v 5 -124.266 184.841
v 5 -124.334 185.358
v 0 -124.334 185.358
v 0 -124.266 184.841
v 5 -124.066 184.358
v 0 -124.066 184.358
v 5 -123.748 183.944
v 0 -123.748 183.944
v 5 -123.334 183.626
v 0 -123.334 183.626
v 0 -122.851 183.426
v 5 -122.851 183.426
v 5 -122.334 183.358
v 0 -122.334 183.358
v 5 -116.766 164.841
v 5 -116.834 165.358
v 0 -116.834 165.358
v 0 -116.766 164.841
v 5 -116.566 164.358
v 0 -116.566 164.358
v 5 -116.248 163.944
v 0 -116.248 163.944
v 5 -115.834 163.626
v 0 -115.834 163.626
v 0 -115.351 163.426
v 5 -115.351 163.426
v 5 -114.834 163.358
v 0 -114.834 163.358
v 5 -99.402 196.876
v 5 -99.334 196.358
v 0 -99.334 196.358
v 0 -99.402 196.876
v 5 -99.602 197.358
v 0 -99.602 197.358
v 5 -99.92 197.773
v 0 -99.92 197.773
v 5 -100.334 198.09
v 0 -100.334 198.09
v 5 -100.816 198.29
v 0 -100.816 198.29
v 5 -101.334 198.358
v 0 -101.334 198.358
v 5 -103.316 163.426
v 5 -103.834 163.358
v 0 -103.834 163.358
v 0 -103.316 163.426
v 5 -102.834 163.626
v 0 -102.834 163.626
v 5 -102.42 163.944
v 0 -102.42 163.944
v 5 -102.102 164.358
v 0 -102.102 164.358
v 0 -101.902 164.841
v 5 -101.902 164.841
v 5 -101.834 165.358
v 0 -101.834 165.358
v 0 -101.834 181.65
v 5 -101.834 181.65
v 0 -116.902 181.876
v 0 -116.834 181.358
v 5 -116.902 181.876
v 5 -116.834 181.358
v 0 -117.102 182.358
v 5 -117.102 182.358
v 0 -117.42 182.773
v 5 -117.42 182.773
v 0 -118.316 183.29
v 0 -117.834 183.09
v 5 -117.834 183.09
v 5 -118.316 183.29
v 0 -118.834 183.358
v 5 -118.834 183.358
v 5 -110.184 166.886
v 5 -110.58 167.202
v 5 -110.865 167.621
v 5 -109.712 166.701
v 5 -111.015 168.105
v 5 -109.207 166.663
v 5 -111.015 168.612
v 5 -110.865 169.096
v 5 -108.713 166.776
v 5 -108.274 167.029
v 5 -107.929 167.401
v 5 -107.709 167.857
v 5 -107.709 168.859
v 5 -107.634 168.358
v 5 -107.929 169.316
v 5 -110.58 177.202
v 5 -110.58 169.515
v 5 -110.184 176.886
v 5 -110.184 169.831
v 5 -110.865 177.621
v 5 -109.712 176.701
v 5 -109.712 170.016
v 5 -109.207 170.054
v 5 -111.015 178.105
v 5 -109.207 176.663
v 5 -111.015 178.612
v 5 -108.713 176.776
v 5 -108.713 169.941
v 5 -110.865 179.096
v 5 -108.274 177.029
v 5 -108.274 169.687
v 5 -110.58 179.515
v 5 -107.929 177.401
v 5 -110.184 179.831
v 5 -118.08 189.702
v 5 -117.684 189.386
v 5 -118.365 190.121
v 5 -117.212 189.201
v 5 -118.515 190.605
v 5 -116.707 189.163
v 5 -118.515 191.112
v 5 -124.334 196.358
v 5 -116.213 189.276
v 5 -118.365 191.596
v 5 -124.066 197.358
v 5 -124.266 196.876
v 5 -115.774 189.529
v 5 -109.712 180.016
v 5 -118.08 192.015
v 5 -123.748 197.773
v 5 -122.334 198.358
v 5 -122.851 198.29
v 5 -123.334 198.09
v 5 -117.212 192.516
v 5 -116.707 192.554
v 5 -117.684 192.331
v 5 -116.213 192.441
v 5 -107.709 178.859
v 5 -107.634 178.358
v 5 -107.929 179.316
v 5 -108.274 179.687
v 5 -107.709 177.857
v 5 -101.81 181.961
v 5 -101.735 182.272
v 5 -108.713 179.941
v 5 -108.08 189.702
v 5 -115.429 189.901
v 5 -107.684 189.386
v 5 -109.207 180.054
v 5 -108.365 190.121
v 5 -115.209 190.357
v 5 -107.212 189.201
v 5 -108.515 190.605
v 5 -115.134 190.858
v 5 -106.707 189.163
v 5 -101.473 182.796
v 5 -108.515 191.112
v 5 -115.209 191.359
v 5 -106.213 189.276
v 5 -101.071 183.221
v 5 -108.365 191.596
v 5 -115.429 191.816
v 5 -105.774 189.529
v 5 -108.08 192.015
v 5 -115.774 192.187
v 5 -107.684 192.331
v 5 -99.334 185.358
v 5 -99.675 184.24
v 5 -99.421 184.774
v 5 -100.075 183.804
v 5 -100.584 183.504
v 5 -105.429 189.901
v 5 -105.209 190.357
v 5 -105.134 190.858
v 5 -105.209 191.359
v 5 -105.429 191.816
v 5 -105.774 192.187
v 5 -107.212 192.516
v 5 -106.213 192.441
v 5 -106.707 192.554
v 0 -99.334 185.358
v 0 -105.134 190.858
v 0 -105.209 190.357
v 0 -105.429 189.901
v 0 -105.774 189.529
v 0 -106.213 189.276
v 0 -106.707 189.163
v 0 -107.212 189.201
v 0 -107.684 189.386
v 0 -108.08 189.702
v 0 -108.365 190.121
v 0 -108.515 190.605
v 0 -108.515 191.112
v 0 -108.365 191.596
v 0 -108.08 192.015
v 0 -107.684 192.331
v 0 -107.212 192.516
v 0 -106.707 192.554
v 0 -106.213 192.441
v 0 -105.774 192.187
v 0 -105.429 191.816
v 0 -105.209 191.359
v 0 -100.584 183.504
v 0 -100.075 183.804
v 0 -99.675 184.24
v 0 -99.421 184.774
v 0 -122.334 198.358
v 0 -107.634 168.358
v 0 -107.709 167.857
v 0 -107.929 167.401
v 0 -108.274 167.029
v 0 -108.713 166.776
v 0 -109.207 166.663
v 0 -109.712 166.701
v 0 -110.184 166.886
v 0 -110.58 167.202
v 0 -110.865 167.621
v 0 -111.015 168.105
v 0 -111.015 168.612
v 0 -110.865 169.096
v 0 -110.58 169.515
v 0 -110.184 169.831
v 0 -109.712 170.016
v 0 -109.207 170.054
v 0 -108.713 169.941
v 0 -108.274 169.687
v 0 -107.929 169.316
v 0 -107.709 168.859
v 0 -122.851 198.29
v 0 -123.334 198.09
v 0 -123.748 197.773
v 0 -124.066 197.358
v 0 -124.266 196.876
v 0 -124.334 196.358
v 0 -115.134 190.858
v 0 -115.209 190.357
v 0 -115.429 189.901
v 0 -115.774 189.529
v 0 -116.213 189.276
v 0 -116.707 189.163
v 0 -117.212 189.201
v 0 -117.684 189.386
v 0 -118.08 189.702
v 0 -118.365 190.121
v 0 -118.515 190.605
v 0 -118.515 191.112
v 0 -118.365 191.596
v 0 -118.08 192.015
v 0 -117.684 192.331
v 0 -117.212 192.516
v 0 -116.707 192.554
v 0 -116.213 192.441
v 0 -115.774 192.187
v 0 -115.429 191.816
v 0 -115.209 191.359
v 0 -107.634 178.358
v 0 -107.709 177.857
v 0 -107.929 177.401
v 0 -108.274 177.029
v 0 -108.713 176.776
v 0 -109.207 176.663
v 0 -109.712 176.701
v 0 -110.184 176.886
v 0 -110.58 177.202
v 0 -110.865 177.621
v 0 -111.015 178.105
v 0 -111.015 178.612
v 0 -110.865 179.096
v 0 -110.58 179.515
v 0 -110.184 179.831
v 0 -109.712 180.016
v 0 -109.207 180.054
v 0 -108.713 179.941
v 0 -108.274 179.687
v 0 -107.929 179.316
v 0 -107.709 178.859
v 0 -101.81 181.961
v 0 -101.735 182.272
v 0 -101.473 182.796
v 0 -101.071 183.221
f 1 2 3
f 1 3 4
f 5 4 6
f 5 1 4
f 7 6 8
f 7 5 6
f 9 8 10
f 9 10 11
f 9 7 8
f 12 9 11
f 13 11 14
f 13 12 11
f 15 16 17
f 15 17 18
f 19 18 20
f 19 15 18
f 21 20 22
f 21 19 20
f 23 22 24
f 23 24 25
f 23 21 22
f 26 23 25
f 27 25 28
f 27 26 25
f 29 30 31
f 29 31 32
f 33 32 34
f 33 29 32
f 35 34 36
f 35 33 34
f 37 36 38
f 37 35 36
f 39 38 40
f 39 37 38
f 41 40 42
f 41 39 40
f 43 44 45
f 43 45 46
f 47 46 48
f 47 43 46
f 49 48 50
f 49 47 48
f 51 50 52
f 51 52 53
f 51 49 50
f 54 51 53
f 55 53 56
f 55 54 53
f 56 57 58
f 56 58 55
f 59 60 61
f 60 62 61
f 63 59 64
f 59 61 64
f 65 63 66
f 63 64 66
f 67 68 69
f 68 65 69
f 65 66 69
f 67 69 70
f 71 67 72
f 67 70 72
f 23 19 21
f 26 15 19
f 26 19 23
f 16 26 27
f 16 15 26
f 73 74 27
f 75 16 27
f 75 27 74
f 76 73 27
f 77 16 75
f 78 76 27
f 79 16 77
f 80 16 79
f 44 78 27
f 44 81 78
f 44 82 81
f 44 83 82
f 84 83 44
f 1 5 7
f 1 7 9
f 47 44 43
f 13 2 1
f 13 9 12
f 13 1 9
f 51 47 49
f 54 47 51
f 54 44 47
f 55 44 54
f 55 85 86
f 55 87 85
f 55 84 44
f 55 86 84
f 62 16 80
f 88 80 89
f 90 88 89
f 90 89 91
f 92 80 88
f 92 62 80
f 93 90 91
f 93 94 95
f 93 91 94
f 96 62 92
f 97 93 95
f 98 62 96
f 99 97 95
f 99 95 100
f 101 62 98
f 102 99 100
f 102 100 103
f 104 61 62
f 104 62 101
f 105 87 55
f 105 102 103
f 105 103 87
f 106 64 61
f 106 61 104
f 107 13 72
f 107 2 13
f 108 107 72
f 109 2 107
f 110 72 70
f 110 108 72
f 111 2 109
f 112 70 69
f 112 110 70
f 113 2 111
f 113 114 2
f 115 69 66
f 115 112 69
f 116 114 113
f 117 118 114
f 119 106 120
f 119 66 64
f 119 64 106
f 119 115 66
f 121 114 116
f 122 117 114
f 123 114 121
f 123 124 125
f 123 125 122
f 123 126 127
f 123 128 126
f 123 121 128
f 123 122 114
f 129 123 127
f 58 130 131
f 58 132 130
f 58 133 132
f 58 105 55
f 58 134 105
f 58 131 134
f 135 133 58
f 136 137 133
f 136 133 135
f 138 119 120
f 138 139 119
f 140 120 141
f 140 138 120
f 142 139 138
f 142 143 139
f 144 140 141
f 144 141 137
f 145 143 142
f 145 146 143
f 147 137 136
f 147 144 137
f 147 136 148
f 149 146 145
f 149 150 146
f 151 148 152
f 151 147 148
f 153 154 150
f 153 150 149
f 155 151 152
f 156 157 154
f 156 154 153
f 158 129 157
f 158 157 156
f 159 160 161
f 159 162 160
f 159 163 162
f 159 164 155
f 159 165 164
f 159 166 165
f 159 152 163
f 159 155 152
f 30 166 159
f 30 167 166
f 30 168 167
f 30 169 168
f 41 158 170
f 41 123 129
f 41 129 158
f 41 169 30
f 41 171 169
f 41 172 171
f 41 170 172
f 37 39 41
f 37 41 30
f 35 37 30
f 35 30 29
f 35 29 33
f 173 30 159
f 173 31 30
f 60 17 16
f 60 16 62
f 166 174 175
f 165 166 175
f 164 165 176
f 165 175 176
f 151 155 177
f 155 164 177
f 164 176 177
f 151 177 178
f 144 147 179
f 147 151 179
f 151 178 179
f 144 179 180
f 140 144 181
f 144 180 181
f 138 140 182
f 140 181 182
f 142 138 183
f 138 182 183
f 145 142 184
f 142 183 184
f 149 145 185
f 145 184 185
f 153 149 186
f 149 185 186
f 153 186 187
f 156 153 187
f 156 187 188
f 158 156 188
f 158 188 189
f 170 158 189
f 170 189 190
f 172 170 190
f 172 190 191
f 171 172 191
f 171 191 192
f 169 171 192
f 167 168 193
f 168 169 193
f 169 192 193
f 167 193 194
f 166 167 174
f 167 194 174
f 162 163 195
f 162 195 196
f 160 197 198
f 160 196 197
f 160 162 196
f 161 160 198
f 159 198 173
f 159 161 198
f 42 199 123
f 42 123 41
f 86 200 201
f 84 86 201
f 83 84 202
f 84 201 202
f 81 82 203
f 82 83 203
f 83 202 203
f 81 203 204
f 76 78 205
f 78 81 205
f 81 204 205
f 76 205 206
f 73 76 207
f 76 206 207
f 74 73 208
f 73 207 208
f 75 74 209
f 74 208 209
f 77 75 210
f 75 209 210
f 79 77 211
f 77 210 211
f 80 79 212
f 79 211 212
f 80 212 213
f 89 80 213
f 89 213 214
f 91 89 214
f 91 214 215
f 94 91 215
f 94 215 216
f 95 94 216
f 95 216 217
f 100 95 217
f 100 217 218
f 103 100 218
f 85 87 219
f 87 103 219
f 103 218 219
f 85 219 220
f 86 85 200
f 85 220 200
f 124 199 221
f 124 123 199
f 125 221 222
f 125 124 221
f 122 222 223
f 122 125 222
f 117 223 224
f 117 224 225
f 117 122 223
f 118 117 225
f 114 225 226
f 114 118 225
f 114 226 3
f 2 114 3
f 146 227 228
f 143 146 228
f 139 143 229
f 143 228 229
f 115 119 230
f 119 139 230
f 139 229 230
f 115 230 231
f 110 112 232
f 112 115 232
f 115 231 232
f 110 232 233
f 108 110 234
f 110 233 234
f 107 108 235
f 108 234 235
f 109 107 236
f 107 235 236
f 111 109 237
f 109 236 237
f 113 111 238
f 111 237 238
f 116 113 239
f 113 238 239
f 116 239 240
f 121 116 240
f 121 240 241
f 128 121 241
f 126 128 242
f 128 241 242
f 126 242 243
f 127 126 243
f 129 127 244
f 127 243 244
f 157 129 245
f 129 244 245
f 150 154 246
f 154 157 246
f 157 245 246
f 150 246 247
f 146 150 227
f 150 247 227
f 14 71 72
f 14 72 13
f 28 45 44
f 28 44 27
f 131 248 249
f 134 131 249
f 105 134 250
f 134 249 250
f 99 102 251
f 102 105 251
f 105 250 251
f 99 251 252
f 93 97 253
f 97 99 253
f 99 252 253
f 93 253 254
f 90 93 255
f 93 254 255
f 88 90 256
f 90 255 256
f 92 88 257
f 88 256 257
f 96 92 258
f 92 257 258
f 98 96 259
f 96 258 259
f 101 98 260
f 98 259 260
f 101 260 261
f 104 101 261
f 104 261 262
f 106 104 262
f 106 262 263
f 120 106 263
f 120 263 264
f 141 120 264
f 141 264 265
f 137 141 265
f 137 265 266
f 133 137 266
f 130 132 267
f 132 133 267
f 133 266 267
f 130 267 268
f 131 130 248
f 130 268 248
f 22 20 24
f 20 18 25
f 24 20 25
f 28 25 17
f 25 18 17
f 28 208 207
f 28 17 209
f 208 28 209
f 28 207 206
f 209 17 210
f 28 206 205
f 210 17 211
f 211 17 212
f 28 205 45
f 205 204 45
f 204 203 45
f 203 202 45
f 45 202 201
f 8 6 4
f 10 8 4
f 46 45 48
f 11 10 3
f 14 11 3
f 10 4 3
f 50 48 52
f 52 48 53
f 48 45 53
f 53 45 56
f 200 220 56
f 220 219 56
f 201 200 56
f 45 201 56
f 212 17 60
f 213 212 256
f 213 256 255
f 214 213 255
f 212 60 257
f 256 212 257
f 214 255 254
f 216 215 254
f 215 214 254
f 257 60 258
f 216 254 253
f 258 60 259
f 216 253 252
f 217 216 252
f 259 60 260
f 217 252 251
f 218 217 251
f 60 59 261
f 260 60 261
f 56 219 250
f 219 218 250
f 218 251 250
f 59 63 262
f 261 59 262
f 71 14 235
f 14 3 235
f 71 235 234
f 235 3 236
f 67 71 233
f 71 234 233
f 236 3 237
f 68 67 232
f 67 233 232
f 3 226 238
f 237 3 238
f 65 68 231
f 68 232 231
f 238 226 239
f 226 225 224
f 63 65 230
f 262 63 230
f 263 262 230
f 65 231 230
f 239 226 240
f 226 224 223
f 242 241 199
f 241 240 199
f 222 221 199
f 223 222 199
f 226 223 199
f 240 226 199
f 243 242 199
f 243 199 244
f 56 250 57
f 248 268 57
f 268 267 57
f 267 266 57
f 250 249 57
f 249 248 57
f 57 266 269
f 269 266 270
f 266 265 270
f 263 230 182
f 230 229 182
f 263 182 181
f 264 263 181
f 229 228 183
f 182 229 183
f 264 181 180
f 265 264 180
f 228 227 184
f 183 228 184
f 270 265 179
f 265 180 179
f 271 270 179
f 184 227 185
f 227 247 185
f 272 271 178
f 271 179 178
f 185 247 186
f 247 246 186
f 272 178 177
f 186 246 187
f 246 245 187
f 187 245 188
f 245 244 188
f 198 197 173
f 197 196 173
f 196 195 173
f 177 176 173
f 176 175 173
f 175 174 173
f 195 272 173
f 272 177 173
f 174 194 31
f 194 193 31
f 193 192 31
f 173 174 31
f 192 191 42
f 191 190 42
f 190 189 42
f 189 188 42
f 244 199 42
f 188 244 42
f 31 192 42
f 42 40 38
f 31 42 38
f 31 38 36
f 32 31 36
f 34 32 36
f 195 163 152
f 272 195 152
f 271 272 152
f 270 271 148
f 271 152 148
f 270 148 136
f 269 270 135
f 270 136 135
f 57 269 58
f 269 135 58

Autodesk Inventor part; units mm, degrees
ref_plane "YZ Plane" through (0, 0, 0) normal (1, 0, 0) x (0, 1, 0)
ref_plane "XZ Plane" through (0, 0, 0) normal (0, 1, 0) x (-1, 0, 0)
ref_plane "XY Plane" through (0, 0, 0) normal (0, 0, 1) x (1, 0, 0)
sketch "スケッチ1" plane through (0, 0, 0) normal (1, 0, 0) x (0, 1, 0)
  line L0 (-166.8338, 198.3583) -> (193.1662, 198.3583)
  line L1 (193.1662, 198.3583) -> (193.1662, 183.3583)
  line L2 (193.1662, 183.3583) -> (-166.8338, 183.3583)
  line L3 (-166.8338, 183.3583) -> (-166.8338, 198.3583)
  line L4 (-166.8338, 233.3583) -> (-181.8338, 233.3583)
  line L5 (-181.8338, 233.3583) -> (-181.8338, 5.8583)
  line L6 (-181.8338, 5.8583) -> (-166.8338, 5.8583)
  line L7 (-166.8338, 5.8583) -> (-166.8338, 233.3583)
  line L8 (-166.8338, 233.3583) -> (-181.8338, 233.3583)
  line L9 (-181.8338, 233.3583) -> (-181.8338, 218.3583)
  line L10 (-181.8338, 218.3583) -> (-166.8338, 218.3583)
  line L11 (-166.8338, 218.3583) -> (-166.8338, 233.3583)
  line L12 (-116.8338, 183.3583) -> (-101.8338, 183.3583)
  line L13 (-101.8338, 183.3583) -> (-101.8338, 5.8583)
  line L14 (-101.8338, 5.8583) -> (-116.8338, 5.8583)
  line L15 (-116.8338, 5.8583) -> (-116.8338, 183.3583)
  line L16 (193.1662, 183.3583) -> (178.1662, 183.3583)
  line L17 (178.1662, 183.3583) -> (178.1662, 5.8583)
  line L18 (178.1662, 5.8583) -> (193.1662, 5.8583)
  line L19 (193.1662, 5.8583) -> (193.1662, 183.3583)
  circle A0 centre (-141.8338, 138.3583) radius 12.5
  circle A1 centre (-141.8338, 98.3583) radius 18.75
  line L20 (193.1662, 5.8583) -> (-166.8338, 5.8583)
  line L21 (-181.8338, 158.3583) -> (-101.8338, 158.3583)
  line L22 (-101.8338, 78.3583) -> (-181.8338, 78.3583)
  circle A2 centre (-141.8338, 98.3583) radius 20
  line L23 (-124.3338, 198.3583) -> (-124.3338, 183.3583)
  line L24 (-101.8338, 183.3583) -> (-101.8338, 198.3583)
  line L25 (-146.8338, 198.3583) -> (-146.8338, 183.3583)
  line L26 (-166.8338, 205.8583) -> (-181.8338, 205.8583)
  line L27 (-166.8338, 175.8583) -> (-181.8338, 175.8583)
  circle A3 centre (158.1662, 138.3583) radius 12.5
  line L28 (193.1662, 163.3583) -> (178.1662, 163.3583)
  line L29 (170.6662, 198.3583) -> (170.6662, 183.3583)
  line L30 (-166.8338, -186.6417) -> (193.1662, -186.6417)
  line L31 (193.1662, -186.6417) -> (193.1662, -171.6417)
  line L32 (193.1662, -171.6417) -> (-166.8338, -171.6417)
  line L33 (-166.8338, -171.6417) -> (-166.8338, -186.6417)
  line L34 (-166.8338, -221.6417) -> (-181.8338, -221.6417)
  line L35 (-181.8338, -221.6417) -> (-181.8338, 5.8583)
  line L36 (-166.8338, 5.8583) -> (-166.8338, -221.6417)
  line L37 (-166.8338, -221.6417) -> (-181.8338, -221.6417)
  line L38 (-181.8338, -221.6417) -> (-181.8338, -206.6417)
  line L39 (-181.8338, -206.6417) -> (-166.8338, -206.6417)
  line L40 (-166.8338, -206.6417) -> (-166.8338, -221.6417)
  line L41 (-116.8338, -171.6417) -> (-101.8338, -171.6417)
  line L42 (-101.8338, -171.6417) -> (-101.8338, 5.8583)
  line L43 (-116.8338, 5.8583) -> (-116.8338, -171.6417)
  line L44 (193.1662, -171.6417) -> (178.1662, -171.6417)
  line L45 (178.1662, -171.6417) -> (178.1662, 5.8583)
  line L46 (193.1662, 5.8583) -> (193.1662, -171.6417)
  circle A4 centre (-141.8338, -126.6417) radius 12.5
  circle A5 centre (-141.8338, -86.6417) radius 18.75
  line L47 (-181.8338, -146.6417) -> (-101.8338, -146.6417)
  line L48 (-101.8338, -66.6417) -> (-181.8338, -66.6417)
  circle A6 centre (-141.8338, -86.6417) radius 20
  line L49 (-124.3338, -186.6417) -> (-124.3338, -171.6417)
  line L50 (-101.8338, -171.6417) -> (-101.8338, -186.6417)
  line L51 (-146.8338, -186.6417) -> (-146.8338, -171.6417)
  line L52 (-166.8338, -194.1417) -> (-181.8338, -194.1417)
  line L53 (-166.8338, -164.1417) -> (-181.8338, -164.1417)
  circle A7 centre (158.1662, -126.6417) radius 12.5
  line L54 (193.1662, -151.6417) -> (178.1662, -151.6417)
  line L55 (170.6662, -186.6417) -> (170.6662, -171.6417)
  line L56 (193.1662, 158.3583) -> (145.6662, 158.3583)
  line L57 (145.6662, 158.3583) -> (145.6662, 78.3583)
  line L58 (145.6662, 78.3583) -> (193.1662, 78.3583)
  line L59 (193.1662, 78.3583) -> (193.1662, 158.3583)
  line L60 (178.1662, 158.3583) -> (154.1437, 150.1934)
  line L61 (147.3229, 132.1397) -> (178.1662, 78.3583)
  circle A8 centre (-116.8338, 190.8583) radius 1.7
  circle A9 centre (-106.8338, 190.8583) radius 1.7
  circle A10 centre (-109.3338, 178.3583) radius 1.7
  circle A11 centre (-109.3338, 168.3583) radius 1.7
  line L62 (-101.8338, 163.3583) -> (-116.8338, 163.3583)
  line L63 (-99.3338, 198.3583) -> (-99.3338, 183.3583)
  point P0 (0, 0)
  point P1 (-174.3338, 200.8583)
  point P2 (-174.3338, 190.8583)
  point P3 (-174.3338, 180.8583)
  point P4 (-161.8338, 190.8583)
  point P5 (-151.8338, 190.8583)
  point P6 (185.6662, 178.3583)
  point P7 (185.6662, 168.3583)
  point P8 (183.1662, 190.8583)
  point P9 (173.1662, 190.8583)
  point P10 (-109.3338, 183.3583)
  point P11 (193.1662, 190.8583)
  point P12 (-109.3338, 98.3583)
  point P13 (-109.3338, 138.3583)
  point P14 (-174.3338, 138.3583)
  point P15 (-174.3338, 98.3583)
  point P16 (-174.3338, -86.6417)
  point P17 (-109.3338, -86.6417)
  point P18 (-109.3338, -126.6417)
  point P19 (-174.3338, -126.6417)
  point P20 (-174.3338, -169.1417)
  point P21 (-174.3338, -179.1417)
  point P22 (-174.3338, -189.1417)
  point P23 (-161.8338, -179.1417)
  point P24 (-151.8338, -179.1417)
  point P25 (-116.8338, -179.1417)
  point P26 (-106.8338, -179.1417)
  point P27 (-109.3338, -166.6417)
  point P28 (-109.3338, -156.6417)
  point P29 (173.1662, -179.1417)
  point P30 (183.1662, -179.1417)
  point P31 (185.6662, -166.6417)
  point P32 (185.6662, -156.6417)
  point P33 (185.6662, 138.3583)
  point P34 (185.6662, 98.3583)
  point P35 (178.1662, 94.6083)
  point P36 (185.6662, -86.6417)
  point P37 (185.6662, -126.6417)
  point P38 (-116.8338, 158.3583)
  dimension "d0" = 7.5
  dimension "d1" = 7.5
  dimension "d2" = 7.5
  dimension "d3" = 7.5
  dimension "d4" = 10
  dimension "d5" = 10
  dimension "d6" = 5
  dimension "d7" = 10
  dimension "d8" = 7.5
  dimension "d9" = 7.5
  dimension "d10" = 7.5
  dimension "d11" = 10
  dimension "d13" = 7.5
  dimension "d14" = 5
  dimension "d15" = 10
  dimension "d16" = 7.5
  dimension "d17" = 7.5
  dimension "d18" = 10
  dimension "d19" = 10
  dimension "d20" = 7.5
  dimension "d21" = 7.5
  dimension "d22" = 5
  dimension "d23" = 10
  dimension "d24" = 7.5
  dimension "d25" = 7.5
  dimension "d26" = 20
  dimension "d27" = 20
  dimension "d28" = 7.5
  dimension "d29" = 7.5
  dimension "d30" = 20
  dimension "d31" = 7.5
  dimension "d32" = 7.5
  dimension "d33" = 20
  dimension "d34" = 3.4
  dimension "d35" = 3.4
  dimension "d36" = 3.4
  dimension "d37" = 3.4
  dimension "d41" = 5
  dimension "d42" = 15
  dimension "d43" = 5
  dimension "d44" = 22.5
  dimension "d45" = 2.5
extrude "押し出し1" add sketch "スケッチ1" along normal blind 5 contours L0 L24 L2 L23 | L0 L63 L2 L24 | L13 L62 L15 L2
fillet "フィレット1" radius 2 8 edges at (2.5, -124.3338, 198.3583) (2.5, -124.3338, 183.3583) (2.5, -116.8338, 183.3583) (2.5, -116.8338, 163.3583) (2.5, -101.8338, 163.3583) (2.5, -99.3338, 198.3583) (2.5, -99.3338, 183.3583) (2.5, -101.8338, 183.3583)
equation "\"d1\" = d0"
equation "\"d2\" = d0"
equation "\"d3\" = d0"
equation "\"d8\" = d0"
equation "\"d9\" = d0"
equation "\"d10\" = d0"
equation "\"d13\" = d0"
equation "\"d16\" = d0"
equation "\"d17\" = d0"
equation "\"d20\" = d21"
equation "\"d24\" = d21"
equation "\"d25\" = d21"
equation "\"d32\" = d31"
equation "\"d33\" = d30"
properties part number "ball_loading_v1_Plate_ASP_F_2" material "ABS プラスチック"
